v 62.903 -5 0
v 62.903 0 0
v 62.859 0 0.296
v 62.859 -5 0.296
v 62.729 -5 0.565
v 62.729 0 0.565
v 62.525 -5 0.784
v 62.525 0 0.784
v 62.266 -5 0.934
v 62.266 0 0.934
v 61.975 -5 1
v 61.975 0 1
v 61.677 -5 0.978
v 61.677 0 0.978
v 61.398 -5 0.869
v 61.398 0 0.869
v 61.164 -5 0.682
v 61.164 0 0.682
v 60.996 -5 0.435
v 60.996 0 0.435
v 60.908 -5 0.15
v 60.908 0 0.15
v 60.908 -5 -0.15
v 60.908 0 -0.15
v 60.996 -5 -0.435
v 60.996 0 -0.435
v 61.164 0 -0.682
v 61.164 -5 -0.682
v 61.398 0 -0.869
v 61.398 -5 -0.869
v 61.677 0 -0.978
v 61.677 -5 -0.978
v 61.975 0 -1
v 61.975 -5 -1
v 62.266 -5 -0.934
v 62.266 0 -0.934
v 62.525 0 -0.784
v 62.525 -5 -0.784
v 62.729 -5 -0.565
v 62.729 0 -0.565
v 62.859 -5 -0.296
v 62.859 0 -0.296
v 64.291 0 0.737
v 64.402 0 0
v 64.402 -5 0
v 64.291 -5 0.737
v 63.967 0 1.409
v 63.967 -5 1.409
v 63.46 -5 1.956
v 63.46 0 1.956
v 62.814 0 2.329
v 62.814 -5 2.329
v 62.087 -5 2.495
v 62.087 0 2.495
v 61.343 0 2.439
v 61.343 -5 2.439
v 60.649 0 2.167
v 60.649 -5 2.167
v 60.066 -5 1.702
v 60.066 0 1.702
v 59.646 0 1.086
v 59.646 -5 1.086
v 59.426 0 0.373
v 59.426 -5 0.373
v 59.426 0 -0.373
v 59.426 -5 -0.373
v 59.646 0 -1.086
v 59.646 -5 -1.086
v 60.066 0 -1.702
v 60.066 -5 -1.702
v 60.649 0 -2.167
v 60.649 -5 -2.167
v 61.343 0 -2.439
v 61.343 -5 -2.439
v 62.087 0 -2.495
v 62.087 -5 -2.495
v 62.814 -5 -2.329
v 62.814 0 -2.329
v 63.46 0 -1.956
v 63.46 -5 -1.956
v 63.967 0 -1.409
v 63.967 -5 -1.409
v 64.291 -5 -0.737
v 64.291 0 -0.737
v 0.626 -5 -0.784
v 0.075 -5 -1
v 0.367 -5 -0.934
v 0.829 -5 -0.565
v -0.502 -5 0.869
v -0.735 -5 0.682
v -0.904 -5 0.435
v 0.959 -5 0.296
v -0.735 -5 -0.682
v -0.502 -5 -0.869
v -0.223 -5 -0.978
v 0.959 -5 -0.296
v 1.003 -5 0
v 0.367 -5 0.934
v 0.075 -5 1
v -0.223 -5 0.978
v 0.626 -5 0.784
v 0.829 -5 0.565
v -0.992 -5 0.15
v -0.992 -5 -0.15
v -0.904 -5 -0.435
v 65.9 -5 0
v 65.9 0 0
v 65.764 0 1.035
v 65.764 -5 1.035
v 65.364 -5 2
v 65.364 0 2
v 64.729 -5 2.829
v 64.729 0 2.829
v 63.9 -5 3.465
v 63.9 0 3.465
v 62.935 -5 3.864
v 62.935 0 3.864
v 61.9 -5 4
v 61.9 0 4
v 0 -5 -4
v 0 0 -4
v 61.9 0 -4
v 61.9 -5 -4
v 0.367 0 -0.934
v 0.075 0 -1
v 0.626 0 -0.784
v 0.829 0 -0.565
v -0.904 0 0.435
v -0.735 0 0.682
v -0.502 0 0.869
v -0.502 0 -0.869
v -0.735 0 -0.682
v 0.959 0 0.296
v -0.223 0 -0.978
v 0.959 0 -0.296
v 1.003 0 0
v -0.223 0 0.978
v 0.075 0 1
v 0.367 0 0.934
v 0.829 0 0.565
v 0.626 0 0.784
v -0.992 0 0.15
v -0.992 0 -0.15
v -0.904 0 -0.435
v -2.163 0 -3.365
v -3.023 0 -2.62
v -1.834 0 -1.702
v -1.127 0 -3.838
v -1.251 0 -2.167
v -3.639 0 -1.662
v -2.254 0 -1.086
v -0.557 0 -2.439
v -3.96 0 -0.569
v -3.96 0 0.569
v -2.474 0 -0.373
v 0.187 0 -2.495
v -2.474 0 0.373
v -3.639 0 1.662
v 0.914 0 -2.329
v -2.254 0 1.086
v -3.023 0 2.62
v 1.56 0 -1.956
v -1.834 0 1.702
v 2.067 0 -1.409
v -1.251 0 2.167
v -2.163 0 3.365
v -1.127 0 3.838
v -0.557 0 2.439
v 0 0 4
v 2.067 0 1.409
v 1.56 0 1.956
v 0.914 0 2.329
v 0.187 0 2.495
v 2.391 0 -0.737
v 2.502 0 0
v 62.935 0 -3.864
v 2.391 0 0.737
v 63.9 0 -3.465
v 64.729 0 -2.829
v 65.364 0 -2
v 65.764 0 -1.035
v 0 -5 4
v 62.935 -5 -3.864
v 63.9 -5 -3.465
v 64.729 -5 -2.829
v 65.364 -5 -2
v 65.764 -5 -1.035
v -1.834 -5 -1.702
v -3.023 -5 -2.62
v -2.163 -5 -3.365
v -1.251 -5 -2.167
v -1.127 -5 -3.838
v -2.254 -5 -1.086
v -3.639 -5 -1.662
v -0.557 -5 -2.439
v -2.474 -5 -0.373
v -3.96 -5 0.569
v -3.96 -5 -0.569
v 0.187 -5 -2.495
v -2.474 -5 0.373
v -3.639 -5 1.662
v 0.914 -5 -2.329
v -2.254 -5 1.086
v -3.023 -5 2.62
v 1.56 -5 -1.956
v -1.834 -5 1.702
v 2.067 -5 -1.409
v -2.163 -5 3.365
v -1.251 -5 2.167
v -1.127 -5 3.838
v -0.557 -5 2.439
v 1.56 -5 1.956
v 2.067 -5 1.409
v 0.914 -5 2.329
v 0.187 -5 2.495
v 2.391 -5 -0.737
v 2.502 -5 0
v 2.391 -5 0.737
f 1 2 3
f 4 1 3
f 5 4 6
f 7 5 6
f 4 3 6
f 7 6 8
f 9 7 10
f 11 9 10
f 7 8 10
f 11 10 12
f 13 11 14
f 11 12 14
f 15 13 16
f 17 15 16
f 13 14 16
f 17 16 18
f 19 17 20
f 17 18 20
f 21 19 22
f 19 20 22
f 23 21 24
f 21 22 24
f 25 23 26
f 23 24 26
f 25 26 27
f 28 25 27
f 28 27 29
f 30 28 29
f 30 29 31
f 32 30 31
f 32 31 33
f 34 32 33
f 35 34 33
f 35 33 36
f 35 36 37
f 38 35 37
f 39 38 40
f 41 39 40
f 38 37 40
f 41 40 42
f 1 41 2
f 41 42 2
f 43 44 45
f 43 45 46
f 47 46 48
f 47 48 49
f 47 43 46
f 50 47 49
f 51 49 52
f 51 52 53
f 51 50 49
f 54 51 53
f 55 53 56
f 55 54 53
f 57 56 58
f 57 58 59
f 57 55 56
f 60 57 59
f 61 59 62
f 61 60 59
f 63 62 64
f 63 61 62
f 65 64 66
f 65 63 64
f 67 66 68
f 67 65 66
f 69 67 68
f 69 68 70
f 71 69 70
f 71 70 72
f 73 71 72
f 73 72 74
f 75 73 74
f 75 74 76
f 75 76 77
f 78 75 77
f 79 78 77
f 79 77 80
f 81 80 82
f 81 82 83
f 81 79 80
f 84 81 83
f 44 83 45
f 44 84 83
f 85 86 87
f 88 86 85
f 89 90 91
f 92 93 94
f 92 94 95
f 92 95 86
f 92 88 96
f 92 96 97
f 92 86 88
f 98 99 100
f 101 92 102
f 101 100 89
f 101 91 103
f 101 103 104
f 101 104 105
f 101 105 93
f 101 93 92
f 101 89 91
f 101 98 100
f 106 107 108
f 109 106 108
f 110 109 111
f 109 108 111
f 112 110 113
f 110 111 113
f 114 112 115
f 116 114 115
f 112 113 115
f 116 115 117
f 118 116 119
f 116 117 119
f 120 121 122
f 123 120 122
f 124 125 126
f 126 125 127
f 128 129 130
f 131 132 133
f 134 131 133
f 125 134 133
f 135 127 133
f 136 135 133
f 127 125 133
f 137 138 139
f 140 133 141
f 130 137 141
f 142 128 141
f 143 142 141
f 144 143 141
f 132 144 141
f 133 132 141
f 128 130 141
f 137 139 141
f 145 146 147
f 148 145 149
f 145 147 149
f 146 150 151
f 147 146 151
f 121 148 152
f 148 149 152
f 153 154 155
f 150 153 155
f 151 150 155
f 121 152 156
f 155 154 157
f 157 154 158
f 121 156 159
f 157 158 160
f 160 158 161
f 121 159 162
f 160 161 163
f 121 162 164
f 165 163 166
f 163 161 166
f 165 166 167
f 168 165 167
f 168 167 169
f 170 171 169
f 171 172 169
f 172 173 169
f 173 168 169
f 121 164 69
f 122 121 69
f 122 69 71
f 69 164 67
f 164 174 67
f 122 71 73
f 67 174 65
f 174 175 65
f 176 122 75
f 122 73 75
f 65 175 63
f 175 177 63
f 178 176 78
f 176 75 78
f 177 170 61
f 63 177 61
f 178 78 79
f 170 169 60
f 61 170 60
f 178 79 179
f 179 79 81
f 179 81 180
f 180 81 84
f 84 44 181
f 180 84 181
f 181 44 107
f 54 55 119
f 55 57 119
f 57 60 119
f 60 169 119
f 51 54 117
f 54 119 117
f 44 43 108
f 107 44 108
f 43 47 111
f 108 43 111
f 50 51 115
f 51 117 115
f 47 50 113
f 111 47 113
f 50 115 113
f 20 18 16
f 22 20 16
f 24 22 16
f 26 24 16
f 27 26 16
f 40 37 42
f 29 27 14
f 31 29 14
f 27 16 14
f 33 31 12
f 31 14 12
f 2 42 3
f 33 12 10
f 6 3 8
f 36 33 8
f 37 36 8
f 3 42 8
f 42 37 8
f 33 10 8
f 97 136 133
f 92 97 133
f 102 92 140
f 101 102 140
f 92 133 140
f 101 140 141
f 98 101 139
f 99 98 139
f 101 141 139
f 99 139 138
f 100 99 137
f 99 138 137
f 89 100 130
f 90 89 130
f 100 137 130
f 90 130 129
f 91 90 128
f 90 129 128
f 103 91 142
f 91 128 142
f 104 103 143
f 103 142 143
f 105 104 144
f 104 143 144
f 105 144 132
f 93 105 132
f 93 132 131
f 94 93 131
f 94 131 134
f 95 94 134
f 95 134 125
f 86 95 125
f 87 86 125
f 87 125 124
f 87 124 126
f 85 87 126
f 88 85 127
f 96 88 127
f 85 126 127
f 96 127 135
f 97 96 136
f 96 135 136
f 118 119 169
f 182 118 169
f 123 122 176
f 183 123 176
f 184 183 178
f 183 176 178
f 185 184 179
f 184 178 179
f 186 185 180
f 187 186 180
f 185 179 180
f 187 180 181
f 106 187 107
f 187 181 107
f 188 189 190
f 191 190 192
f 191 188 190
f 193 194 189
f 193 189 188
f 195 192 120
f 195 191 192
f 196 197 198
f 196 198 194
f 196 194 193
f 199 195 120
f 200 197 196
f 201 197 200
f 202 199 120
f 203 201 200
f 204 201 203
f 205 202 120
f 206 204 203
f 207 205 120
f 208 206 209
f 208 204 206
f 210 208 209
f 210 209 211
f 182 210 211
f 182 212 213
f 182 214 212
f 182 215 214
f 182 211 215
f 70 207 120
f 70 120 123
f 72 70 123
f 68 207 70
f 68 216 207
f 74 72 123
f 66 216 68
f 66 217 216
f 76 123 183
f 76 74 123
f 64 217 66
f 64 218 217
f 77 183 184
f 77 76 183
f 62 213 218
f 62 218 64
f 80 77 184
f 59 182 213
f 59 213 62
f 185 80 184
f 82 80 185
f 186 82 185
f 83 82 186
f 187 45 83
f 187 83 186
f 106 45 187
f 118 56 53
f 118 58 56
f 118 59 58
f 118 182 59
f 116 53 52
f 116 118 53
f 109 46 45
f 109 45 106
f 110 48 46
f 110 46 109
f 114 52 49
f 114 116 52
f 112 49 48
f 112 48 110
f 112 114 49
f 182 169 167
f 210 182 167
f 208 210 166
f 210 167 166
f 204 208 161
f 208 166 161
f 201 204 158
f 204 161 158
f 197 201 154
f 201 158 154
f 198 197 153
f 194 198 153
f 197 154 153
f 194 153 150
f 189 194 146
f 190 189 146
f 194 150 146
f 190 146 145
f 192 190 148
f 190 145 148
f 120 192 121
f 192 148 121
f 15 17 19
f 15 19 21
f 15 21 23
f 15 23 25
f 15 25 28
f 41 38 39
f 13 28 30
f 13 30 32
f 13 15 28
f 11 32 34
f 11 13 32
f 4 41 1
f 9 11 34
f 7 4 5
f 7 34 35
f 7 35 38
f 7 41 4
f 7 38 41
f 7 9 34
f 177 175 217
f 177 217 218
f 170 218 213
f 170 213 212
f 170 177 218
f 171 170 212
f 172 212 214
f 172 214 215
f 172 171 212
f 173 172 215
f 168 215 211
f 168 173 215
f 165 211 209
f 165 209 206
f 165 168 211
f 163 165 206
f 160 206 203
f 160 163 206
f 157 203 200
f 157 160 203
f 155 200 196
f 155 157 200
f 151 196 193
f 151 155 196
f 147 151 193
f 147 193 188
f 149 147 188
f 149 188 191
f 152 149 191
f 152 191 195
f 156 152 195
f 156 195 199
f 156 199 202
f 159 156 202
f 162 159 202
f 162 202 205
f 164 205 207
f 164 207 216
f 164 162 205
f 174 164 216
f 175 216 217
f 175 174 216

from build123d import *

# Parameters (mm, degrees)
F0_R     = 2.5019
F0_R_2   = 1.0033
F1_DEPTH = 5


with BuildPart() as f1:
    # F0 (on Front) → F1 (new body)
    with BuildSketch(Plane.XZ):
        with BuildLine():
            ThreePointArc((0, -4.0005), (2.828781, -2.828781), (4.0005, 0))
            ThreePointArc((4.0005, 0), (2.828781, 2.828781), (0, 4.0005))
            ThreePointArc((0, 4.0005), (-4.0005, 0), (0, -4.0005))
        make_face()
        Circle(F0_R, mode=Mode.SUBTRACT)
        with BuildLine():
            ThreePointArc((0, 4.0005), (2.828781, 2.828781), (4.0005, 0))
            ThreePointArc((4.0005, 0), (2.828781, -2.828781), (0, -4.0005))
            Line((0, -4.0005), (61.8998, -4.0005))
            ThreePointArc((61.8998, -4.0005), (57.8993, 0), (61.8998, 4.0005))
            Line((61.8998, 4.0005), (0, 4.0005))
        make_face()
        with BuildLine():
            ThreePointArc((65.9003, 0), (64.728581, 2.828781), (61.8998, 4.0005))
            ThreePointArc((61.8998, 4.0005), (57.8993, 0), (61.8998, -4.0005))
            ThreePointArc((61.8998, -4.0005), (64.728581, -2.828781), (65.9003, 0))
        make_face()
        with Locations((61.8998, 0)):
            Circle(F0_R, mode=Mode.SUBTRACT)
        Circle(F0_R_2)
        with Locations((61.8998, 0)):
            Circle(F0_R_2)
    extrude(amount=F1_DEPTH)


solid = f1.part
